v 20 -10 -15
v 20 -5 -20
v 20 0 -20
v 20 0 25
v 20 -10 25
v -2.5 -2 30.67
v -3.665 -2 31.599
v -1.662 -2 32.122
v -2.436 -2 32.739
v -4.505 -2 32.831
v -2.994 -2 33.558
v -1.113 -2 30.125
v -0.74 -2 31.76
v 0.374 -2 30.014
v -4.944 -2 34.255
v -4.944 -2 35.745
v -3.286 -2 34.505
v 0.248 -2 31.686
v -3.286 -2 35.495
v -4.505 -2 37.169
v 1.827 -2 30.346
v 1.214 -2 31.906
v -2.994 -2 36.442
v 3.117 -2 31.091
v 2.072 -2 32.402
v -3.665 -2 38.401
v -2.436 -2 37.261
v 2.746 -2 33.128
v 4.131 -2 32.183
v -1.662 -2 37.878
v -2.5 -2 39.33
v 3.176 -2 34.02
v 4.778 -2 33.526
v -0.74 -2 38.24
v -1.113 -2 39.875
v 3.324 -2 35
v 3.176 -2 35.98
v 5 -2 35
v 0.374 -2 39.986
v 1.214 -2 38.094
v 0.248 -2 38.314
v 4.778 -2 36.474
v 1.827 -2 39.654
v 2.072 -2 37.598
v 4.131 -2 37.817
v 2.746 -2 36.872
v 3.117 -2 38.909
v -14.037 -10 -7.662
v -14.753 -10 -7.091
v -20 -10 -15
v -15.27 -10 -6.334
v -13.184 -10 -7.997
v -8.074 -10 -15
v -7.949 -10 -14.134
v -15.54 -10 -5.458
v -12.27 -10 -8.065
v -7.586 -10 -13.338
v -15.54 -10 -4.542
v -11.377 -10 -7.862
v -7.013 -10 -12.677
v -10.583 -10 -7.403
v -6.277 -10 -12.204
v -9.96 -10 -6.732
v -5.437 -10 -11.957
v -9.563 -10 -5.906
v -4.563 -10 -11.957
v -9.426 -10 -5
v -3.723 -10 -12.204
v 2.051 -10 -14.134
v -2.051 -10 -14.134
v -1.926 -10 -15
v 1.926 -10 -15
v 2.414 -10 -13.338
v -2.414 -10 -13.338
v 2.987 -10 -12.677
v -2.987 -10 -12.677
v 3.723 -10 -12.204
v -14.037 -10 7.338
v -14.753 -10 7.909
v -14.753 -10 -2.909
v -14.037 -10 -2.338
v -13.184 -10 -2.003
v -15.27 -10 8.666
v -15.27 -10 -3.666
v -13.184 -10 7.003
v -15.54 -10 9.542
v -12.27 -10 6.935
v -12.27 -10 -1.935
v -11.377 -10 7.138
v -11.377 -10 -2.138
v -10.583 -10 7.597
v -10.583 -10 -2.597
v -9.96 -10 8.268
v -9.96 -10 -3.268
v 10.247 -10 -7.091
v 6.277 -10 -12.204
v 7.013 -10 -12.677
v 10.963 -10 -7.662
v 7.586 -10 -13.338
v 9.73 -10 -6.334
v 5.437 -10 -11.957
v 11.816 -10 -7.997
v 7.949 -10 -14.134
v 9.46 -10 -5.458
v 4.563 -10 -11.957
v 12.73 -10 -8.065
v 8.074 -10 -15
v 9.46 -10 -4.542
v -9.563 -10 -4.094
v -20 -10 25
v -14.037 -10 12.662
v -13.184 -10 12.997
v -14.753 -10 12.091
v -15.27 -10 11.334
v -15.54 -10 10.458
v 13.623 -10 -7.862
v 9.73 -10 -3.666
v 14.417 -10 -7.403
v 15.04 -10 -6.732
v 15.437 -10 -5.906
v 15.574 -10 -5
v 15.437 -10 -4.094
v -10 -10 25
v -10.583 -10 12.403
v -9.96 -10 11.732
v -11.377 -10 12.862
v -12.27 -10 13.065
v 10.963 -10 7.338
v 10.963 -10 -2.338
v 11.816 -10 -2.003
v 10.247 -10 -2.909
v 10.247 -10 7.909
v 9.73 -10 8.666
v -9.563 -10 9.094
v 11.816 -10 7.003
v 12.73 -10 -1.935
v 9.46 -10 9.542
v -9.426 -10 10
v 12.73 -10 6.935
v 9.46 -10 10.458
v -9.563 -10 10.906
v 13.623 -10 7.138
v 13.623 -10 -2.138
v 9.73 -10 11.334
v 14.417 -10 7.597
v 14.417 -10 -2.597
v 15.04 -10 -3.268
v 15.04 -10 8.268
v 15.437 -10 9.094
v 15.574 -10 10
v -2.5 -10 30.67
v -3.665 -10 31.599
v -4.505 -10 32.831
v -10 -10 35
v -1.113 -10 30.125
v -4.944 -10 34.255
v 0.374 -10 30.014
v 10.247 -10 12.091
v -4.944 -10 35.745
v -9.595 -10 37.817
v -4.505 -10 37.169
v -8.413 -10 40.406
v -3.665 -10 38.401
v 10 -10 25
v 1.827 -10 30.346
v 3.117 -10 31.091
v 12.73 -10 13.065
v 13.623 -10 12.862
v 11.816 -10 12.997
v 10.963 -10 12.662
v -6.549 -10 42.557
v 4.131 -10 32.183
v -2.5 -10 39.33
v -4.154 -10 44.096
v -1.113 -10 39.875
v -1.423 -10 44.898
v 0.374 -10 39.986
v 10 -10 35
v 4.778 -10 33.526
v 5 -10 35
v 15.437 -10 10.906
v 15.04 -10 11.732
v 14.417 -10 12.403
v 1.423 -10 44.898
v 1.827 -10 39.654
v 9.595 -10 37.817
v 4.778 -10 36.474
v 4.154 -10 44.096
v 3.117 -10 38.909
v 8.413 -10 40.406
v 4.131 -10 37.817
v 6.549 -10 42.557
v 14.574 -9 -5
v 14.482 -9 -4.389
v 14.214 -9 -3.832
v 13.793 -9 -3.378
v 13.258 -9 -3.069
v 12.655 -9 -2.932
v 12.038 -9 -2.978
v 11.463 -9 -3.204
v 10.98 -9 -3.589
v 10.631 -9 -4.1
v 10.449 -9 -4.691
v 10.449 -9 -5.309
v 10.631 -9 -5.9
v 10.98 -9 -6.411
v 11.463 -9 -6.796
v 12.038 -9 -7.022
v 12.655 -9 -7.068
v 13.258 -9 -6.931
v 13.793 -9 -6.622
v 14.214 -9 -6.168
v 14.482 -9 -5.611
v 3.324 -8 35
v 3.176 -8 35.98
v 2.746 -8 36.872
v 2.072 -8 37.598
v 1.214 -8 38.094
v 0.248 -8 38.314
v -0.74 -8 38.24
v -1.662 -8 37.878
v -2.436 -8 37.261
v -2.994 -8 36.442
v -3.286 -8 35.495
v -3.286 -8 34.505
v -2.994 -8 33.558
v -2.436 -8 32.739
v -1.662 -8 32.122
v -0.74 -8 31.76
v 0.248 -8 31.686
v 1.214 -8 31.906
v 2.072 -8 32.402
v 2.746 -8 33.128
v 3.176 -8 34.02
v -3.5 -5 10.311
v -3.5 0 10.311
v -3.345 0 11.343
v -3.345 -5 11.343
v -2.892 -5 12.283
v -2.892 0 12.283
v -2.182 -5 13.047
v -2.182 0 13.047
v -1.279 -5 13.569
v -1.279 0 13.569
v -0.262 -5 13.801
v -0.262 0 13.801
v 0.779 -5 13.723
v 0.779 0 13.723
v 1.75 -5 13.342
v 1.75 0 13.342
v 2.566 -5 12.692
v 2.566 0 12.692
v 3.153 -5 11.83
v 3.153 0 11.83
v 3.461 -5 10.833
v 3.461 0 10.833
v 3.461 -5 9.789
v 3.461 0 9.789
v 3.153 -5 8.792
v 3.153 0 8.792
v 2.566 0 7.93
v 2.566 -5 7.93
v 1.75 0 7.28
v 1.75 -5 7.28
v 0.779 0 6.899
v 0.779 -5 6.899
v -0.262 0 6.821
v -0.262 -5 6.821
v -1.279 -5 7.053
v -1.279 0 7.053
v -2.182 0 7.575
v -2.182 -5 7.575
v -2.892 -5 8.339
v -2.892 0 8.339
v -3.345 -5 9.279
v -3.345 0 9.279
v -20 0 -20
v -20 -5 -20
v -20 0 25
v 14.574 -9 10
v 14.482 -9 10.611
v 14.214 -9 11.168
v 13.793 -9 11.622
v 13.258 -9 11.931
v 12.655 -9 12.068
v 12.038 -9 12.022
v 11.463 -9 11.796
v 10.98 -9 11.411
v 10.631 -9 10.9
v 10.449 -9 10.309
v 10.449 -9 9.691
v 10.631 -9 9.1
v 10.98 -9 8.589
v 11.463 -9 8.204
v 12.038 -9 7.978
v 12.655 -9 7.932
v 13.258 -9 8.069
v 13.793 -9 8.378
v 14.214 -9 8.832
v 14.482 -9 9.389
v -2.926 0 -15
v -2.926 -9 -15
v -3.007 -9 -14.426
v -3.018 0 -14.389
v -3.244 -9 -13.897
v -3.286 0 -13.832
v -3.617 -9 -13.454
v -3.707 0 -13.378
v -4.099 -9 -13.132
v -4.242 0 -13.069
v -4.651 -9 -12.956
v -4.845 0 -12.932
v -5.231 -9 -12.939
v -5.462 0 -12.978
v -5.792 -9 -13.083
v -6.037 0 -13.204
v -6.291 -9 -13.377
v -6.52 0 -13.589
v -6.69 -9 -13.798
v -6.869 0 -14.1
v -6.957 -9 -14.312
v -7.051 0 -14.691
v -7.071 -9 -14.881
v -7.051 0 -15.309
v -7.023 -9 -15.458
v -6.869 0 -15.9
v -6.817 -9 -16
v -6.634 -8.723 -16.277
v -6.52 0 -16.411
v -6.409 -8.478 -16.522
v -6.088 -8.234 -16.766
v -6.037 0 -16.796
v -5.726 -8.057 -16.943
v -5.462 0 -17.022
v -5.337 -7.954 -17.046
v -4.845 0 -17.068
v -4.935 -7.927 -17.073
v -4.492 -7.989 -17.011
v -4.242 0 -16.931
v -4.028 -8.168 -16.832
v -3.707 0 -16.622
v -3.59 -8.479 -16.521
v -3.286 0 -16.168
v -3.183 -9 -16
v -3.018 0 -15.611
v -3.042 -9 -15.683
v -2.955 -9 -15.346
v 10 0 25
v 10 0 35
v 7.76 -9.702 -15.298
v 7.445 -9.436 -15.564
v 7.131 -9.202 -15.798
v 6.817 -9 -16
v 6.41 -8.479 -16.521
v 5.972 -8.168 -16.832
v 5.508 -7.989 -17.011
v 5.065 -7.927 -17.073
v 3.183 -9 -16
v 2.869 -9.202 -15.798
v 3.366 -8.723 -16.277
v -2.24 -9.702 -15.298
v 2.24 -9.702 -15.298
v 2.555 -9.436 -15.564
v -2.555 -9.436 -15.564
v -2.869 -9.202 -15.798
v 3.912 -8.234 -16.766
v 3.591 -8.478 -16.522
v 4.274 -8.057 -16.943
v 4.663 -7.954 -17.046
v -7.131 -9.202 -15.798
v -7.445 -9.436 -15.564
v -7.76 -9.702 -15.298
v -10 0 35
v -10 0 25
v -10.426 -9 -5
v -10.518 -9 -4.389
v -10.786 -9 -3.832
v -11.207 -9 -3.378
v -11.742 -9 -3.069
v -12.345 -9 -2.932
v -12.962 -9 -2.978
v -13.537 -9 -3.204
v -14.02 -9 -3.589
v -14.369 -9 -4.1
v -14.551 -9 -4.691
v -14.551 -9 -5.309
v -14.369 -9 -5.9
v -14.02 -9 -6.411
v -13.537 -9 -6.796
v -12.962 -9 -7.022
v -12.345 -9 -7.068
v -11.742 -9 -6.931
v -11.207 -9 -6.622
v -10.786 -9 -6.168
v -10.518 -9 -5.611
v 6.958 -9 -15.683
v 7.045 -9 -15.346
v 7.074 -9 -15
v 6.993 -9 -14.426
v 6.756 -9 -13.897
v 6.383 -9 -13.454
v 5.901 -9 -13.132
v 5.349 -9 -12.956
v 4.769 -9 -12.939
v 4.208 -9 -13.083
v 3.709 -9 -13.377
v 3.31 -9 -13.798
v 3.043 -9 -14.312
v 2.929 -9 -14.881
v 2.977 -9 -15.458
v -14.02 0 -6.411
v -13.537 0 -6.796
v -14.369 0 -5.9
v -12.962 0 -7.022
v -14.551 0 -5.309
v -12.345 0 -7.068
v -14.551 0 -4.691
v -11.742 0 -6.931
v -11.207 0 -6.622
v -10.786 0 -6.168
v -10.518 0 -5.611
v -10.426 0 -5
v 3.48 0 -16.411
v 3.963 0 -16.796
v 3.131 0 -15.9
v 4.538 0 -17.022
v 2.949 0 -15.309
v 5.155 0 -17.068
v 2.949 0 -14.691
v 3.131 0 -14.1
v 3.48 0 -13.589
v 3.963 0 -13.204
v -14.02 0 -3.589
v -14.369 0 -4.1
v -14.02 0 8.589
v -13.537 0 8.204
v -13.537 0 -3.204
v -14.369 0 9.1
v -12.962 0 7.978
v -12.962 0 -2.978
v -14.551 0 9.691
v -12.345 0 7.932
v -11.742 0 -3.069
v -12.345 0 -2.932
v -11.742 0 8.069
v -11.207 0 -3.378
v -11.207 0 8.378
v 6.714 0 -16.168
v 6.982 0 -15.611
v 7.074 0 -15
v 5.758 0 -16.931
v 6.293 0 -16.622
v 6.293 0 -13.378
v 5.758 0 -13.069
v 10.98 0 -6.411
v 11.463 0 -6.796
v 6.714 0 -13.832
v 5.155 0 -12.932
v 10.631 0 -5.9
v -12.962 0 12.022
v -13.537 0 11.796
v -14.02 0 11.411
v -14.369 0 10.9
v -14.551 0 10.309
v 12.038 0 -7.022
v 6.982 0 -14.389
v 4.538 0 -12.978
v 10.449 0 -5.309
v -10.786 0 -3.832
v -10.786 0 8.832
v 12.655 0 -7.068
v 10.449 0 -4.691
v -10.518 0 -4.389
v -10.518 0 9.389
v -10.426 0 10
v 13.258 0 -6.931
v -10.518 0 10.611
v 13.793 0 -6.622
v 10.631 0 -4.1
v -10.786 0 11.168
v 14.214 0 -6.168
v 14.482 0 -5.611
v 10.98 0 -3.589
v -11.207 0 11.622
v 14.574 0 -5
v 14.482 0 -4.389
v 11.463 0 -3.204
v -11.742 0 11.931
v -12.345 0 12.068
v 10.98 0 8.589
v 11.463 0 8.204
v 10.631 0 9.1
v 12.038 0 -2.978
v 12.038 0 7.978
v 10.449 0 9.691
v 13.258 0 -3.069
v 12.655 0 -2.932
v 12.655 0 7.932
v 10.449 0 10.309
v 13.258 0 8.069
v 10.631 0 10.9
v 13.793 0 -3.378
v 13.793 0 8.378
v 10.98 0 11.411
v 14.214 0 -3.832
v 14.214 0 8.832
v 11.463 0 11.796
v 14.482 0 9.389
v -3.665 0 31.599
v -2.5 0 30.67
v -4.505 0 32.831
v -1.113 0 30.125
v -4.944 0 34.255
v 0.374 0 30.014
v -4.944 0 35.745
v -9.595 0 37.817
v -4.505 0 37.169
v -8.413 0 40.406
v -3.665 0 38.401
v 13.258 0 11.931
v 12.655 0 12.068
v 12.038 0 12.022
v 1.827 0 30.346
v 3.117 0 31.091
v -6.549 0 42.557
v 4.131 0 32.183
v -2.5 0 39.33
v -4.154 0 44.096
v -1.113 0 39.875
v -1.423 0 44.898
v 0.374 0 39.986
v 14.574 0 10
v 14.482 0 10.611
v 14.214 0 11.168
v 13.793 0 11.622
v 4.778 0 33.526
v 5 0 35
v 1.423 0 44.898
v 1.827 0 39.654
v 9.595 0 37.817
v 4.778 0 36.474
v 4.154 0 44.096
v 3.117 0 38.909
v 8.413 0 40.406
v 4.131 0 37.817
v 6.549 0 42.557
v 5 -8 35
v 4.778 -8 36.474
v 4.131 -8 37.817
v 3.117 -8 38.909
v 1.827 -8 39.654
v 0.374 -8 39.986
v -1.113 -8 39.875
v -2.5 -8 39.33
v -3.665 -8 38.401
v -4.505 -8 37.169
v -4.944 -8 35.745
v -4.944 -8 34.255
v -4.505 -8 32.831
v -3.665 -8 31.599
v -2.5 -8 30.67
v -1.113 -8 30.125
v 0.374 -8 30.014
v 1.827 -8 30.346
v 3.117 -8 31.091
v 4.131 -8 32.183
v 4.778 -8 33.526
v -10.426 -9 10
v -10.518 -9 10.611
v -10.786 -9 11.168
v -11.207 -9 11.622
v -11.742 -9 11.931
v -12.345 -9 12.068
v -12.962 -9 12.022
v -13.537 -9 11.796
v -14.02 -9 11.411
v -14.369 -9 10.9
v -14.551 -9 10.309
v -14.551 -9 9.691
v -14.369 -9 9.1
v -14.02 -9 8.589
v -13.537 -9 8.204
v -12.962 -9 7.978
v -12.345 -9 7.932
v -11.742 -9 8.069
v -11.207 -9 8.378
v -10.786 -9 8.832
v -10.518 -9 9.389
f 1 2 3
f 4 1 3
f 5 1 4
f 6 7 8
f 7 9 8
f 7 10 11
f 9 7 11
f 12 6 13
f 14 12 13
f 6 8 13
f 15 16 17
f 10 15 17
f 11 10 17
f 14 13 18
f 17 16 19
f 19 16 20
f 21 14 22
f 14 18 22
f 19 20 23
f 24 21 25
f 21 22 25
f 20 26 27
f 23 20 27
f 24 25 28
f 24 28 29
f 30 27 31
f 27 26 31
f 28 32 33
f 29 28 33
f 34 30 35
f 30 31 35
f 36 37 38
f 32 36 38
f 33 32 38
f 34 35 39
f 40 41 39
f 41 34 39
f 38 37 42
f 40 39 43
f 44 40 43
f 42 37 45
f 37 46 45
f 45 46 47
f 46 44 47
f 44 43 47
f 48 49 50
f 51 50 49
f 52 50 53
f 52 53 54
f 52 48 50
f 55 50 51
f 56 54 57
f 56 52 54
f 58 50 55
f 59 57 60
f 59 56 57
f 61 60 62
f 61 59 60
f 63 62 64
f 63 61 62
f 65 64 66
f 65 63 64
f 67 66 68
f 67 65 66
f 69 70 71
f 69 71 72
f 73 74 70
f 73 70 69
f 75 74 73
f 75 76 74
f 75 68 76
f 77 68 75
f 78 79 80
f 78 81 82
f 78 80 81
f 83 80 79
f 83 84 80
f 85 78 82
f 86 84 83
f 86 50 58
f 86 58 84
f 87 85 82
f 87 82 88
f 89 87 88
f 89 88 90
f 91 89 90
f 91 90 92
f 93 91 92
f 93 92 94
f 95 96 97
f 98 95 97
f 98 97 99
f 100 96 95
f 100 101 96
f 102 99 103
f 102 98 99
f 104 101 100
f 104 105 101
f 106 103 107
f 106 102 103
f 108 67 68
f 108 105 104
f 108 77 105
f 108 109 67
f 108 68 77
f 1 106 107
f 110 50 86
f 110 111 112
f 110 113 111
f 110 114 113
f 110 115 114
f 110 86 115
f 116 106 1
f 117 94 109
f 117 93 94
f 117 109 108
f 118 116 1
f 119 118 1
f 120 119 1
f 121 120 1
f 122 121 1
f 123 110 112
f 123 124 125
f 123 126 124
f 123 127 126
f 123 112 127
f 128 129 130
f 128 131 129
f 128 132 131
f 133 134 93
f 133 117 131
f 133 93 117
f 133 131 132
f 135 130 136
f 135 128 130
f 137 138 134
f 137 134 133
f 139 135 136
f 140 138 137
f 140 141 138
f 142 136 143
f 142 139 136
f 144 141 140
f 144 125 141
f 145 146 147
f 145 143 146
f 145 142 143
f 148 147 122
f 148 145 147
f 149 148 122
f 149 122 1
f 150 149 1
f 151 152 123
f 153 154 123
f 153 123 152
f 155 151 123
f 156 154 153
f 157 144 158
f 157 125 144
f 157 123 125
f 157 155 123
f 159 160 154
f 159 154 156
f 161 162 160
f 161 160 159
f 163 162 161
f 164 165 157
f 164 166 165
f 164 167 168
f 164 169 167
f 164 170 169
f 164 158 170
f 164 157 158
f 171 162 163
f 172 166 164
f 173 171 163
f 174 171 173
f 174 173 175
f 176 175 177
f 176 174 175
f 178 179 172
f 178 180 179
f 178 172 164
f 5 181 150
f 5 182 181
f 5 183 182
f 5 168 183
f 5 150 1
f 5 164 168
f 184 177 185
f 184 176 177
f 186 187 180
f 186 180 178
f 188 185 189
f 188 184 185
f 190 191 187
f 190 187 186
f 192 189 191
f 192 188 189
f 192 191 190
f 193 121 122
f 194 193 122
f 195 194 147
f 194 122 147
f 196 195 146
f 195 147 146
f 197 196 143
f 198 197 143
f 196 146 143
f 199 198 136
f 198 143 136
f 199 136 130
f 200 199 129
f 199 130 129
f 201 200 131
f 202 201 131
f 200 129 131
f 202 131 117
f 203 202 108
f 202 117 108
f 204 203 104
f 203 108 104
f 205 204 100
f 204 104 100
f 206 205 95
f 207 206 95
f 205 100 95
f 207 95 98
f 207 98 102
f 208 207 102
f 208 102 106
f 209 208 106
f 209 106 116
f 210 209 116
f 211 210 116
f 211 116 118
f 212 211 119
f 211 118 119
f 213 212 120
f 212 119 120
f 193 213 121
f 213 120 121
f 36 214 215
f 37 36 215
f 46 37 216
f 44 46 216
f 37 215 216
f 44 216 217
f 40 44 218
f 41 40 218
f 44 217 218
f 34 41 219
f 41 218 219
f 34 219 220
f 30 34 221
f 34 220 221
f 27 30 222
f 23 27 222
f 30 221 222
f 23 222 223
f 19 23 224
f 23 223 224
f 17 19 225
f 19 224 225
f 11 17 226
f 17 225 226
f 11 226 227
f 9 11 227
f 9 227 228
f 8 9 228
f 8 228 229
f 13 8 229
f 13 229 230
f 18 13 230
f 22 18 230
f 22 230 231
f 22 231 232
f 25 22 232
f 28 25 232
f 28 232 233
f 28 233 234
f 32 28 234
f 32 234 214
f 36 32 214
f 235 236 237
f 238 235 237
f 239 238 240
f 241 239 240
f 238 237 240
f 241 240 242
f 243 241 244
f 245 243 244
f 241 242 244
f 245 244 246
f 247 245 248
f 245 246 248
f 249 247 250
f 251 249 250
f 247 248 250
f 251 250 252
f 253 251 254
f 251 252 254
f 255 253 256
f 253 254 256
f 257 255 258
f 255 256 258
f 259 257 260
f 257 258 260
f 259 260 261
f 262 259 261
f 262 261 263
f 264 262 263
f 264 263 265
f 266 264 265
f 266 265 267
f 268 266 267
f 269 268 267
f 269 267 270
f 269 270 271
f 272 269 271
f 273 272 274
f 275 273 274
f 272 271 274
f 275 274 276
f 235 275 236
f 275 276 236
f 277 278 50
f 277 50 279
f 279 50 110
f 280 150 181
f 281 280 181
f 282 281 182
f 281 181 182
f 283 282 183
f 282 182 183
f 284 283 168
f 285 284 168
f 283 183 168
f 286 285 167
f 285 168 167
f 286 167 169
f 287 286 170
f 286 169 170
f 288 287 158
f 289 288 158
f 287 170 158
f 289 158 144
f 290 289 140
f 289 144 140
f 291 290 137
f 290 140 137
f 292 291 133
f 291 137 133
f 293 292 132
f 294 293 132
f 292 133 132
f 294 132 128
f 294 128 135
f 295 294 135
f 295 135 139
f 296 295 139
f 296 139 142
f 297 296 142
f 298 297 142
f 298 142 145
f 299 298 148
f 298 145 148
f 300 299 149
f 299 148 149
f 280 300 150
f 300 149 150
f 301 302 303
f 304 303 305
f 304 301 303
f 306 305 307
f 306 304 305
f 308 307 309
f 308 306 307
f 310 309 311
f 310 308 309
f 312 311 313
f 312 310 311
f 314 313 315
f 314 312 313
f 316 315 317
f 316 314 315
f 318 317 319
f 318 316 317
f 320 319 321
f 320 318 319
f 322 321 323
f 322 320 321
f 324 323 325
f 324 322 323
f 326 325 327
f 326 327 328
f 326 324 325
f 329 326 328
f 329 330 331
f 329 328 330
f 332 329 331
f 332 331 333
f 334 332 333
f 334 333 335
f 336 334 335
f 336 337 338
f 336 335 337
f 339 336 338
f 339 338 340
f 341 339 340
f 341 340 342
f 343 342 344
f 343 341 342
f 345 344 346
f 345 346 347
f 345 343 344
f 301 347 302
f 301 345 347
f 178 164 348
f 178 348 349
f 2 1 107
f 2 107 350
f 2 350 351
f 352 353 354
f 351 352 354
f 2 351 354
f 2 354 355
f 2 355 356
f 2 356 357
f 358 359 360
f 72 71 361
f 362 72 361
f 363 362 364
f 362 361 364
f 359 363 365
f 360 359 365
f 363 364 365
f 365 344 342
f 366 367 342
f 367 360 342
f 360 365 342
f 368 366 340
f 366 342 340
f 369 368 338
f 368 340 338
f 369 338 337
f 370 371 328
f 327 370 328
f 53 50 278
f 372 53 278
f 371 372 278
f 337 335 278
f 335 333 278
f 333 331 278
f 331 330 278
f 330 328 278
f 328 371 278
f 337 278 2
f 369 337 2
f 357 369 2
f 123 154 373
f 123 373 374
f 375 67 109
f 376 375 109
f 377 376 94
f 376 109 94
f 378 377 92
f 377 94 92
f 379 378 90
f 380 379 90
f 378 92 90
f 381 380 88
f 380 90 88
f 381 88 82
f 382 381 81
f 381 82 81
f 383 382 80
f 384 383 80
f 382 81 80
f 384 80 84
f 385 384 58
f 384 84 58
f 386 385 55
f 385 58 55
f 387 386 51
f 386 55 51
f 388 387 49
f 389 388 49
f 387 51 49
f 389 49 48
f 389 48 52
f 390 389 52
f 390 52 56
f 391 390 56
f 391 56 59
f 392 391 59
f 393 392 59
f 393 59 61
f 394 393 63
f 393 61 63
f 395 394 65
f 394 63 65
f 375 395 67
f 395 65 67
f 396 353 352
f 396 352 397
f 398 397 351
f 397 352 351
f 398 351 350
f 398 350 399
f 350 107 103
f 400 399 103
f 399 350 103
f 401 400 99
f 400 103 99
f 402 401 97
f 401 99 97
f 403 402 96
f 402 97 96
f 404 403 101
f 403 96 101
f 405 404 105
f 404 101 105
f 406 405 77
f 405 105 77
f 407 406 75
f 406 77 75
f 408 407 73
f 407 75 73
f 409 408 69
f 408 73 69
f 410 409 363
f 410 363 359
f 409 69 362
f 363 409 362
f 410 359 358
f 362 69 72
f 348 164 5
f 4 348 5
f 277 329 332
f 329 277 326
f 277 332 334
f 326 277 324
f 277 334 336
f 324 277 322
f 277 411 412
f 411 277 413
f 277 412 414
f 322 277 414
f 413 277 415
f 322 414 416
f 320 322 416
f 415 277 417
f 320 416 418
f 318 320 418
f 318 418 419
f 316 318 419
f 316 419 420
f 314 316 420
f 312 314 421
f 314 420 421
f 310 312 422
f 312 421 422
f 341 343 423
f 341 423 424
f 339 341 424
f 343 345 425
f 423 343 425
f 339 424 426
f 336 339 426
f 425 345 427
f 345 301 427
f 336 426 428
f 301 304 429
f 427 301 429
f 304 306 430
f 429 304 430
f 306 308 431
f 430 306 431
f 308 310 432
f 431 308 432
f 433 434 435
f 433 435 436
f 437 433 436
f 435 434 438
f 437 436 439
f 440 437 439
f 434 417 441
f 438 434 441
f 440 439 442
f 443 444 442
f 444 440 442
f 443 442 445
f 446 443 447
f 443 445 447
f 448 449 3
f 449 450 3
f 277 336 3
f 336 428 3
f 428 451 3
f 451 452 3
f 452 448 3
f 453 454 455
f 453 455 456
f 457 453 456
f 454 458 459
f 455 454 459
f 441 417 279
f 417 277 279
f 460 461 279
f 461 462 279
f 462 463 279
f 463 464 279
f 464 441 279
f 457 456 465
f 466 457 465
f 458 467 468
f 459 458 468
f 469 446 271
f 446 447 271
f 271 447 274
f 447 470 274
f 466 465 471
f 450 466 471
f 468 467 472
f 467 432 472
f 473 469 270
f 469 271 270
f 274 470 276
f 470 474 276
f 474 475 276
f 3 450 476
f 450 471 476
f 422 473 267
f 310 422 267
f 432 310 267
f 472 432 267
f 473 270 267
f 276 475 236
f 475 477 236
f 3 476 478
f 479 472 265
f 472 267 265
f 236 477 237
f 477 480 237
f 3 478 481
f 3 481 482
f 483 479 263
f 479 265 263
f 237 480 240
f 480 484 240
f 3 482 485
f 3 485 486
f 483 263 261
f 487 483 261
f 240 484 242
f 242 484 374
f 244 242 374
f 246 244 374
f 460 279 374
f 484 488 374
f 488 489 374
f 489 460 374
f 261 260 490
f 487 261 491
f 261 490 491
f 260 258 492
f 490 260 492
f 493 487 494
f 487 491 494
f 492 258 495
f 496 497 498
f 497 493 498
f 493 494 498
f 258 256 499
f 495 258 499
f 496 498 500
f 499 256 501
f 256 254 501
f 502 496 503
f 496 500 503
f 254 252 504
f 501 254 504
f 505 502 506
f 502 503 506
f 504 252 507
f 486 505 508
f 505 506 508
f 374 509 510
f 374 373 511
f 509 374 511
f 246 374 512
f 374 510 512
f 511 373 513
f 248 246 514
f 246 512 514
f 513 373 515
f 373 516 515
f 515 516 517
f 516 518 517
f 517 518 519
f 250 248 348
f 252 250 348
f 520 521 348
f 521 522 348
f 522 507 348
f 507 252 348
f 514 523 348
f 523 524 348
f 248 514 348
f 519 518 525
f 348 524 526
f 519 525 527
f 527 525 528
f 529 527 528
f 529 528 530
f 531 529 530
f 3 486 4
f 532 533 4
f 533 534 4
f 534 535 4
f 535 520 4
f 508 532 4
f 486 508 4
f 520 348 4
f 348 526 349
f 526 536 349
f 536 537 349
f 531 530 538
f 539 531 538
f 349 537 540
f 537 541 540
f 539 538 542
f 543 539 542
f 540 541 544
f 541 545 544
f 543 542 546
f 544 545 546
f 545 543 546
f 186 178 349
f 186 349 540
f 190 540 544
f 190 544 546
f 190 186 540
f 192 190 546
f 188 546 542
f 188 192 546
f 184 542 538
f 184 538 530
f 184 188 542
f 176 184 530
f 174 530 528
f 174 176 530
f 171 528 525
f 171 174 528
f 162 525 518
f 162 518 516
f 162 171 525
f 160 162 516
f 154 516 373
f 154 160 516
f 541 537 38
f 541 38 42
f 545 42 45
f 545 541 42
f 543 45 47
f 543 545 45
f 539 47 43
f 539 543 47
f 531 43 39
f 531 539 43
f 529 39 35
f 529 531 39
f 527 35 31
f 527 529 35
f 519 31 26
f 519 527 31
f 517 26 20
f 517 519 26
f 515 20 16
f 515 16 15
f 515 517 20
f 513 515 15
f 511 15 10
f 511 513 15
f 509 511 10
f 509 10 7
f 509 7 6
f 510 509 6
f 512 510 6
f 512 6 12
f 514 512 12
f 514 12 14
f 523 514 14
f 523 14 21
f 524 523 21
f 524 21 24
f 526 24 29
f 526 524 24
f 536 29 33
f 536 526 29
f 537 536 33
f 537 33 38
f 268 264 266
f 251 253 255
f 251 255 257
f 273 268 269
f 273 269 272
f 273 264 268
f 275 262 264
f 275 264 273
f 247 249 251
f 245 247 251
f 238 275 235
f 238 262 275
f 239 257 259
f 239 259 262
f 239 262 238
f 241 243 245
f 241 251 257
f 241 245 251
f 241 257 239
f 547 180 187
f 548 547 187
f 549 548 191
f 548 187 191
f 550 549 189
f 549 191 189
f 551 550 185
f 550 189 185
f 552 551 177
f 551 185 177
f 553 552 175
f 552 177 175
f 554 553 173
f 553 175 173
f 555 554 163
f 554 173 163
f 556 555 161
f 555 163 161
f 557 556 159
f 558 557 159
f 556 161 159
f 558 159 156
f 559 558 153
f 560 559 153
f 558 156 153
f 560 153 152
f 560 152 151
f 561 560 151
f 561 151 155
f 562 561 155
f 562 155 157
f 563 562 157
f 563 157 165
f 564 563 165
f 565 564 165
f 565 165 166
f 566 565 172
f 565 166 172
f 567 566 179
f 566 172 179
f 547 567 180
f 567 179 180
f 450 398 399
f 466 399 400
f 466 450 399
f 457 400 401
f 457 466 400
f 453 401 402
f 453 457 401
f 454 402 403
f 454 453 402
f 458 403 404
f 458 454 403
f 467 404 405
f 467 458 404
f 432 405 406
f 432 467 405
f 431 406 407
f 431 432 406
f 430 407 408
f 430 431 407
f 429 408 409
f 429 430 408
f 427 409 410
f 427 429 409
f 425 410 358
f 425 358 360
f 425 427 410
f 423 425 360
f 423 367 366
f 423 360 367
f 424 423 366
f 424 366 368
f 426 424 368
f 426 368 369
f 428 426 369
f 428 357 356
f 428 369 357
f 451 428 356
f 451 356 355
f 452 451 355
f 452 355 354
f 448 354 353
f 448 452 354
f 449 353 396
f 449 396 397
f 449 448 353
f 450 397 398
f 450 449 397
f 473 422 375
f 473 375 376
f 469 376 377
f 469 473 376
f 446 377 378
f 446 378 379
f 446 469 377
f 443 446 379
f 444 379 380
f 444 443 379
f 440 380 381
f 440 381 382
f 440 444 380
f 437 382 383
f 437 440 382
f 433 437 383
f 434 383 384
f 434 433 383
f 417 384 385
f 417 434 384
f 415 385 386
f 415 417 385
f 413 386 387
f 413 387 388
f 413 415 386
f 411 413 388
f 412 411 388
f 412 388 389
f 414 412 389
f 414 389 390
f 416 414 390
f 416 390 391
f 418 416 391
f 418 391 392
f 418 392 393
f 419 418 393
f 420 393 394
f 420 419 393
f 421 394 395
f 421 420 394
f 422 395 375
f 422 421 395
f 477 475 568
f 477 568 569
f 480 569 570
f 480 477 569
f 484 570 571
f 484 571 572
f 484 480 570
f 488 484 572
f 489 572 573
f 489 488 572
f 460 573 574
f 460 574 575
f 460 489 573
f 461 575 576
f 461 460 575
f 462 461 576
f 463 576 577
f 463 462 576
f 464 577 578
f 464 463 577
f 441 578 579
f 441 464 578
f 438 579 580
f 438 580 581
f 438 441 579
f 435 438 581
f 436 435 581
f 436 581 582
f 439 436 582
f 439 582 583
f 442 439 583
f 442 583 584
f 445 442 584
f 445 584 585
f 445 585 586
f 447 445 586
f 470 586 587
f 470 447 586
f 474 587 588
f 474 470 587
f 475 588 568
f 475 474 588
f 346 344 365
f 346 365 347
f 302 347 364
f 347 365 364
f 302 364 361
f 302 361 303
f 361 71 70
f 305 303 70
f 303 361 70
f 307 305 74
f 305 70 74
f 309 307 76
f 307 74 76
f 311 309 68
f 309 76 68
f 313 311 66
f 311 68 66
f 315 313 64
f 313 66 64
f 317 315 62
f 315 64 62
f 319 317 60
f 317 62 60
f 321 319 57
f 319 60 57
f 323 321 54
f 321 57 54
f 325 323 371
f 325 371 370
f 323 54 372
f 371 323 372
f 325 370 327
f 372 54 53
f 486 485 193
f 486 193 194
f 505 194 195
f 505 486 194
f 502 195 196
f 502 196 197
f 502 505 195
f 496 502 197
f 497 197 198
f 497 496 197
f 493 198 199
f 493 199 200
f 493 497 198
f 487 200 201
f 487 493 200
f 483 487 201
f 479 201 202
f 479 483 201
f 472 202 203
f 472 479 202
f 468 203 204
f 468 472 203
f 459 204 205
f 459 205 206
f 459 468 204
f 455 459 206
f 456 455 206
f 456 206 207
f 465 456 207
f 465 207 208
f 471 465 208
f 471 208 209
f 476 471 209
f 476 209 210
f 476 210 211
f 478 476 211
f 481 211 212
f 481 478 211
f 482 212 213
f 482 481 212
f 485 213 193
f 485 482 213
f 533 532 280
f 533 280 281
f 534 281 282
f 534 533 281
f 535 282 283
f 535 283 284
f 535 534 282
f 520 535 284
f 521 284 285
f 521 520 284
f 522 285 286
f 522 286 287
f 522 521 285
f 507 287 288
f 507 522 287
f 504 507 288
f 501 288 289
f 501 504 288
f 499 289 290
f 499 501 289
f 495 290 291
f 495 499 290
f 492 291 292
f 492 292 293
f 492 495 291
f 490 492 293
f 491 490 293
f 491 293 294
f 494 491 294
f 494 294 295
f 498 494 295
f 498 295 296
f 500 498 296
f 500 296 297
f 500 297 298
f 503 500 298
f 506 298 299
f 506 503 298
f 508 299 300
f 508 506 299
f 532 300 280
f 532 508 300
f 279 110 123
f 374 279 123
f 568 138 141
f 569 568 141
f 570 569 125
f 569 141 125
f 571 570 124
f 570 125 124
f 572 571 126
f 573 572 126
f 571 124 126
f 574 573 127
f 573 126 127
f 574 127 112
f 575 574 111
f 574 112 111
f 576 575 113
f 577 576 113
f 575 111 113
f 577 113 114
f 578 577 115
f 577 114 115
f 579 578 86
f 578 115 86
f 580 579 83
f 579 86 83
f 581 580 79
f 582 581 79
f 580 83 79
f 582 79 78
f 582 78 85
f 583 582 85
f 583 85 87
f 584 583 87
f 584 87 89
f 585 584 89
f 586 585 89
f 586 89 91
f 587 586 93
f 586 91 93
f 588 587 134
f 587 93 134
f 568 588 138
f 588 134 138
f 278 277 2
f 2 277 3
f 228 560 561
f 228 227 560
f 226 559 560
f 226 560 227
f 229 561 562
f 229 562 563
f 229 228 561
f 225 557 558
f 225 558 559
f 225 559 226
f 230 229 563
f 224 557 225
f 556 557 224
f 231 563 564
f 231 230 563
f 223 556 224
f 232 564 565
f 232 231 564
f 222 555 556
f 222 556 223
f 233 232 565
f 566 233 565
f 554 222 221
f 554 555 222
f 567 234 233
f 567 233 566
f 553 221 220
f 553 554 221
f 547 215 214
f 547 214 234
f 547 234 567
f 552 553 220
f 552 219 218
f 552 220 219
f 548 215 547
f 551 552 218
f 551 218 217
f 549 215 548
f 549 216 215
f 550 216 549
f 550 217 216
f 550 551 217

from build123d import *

# Parameters (mm, degrees)
F0_W         = 40
F0_H         = 40
F0_R         = 2.074
F1_DEPTH     = 10
F2_W         = 10
F2_H         = 5
F3_DEPTH     = 10
F4_SIZE      = 1
F5_R         = 3.3235
F6_DEPTH     = 10.001
F7_R         = 5
F7_R_2       = 3.3235
F8_DEPTH     = 2
F10_R        = 3.5
F11_DEPTH    = 5
F12_T1_DEPTH = 65.7168298797


# Not quite as in the source:
# - a fillet or chamfer that OpenCascade refuses, or shapes differently, is made with other operations: its cross-section is extruded or revolved along the edge and cut away or added
# - a pattern or mirror of a feature is missing from the dataset's text; its kind, count and spacing are read off the source's solid


with BuildPart() as f1:
    # F0 (on Front) → F1 (new body)
    with BuildSketch(Plane.XZ):
        Rectangle(F0_W, F0_H)
        with Locations((-5, -15)):
            Circle(F0_R, mode=Mode.SUBTRACT)
        with Locations((-12.5, -5)):
            Circle(F0_R, mode=Mode.SUBTRACT)
        with Locations((5, -15)):
            Circle(F0_R, mode=Mode.SUBTRACT)
        with Locations((12.5, -5)):
            Circle(F0_R, mode=Mode.SUBTRACT)
        with Locations((-12.5, 10)):
            Circle(F0_R, mode=Mode.SUBTRACT)
        with Locations((12.5, 10)):
            Circle(F0_R, mode=Mode.SUBTRACT)
    extrude(amount=F1_DEPTH)

    # F2 (on face) → F3 (join, through all)
    with BuildSketch(Plane.XZ.offset(10)):
        with BuildLine():
            Line((10, 25), (10, 35))
            ThreePointArc((10, 35), (0, 45), (-10, 35))
            Line((-10, 35), (-10, 25))
            Line((-10, 25), (-10, 20))
            Line((-10, 20), (10, 20))
            Line((10, 20), (10, 25))
        make_face()
        with Locations((-15, 22.5)):
            Rectangle(F2_W, F2_H)
        with Locations((15, 22.5)):
            Rectangle(F2_W, F2_H)
    extrude(amount=-F3_DEPTH)

    # F4
    f4_edges = [f1.edges().sort_by_distance(p)[0] for p in [
        (-7.074, -10, -15),
        (2.926, -10, -15),
        (-14.574, -10, 10),
        (-14.574, -10, -5),
        (10.426, -10, -5),
        (10.426, -10, 10),
    ]]
    chamfer(f4_edges, length=F4_SIZE)

    # F5 (on face) → F6 (cut, through all)
    with BuildSketch(Plane.XZ.offset(10)):
        with Locations((0, 35)):
            Circle(F5_R)
    extrude(amount=-F6_DEPTH, mode=Mode.SUBTRACT)

    # F7 (on face) → F8 (cut)
    with BuildSketch(Plane.XZ.offset(10)):
        with Locations((0, 35)):
            Circle(F7_R)
        with Locations((0, 35)):
            Circle(F7_R_2, mode=Mode.SUBTRACT)
    f8 = extrude(amount=-F8_DEPTH, mode=Mode.SUBTRACT)

    # F8_copies: F8 across plane
    add(f8.mirror(Plane.ZX.offset(-5)), mode=Mode.SUBTRACT)

    # F10 (on face) → F11 (cut)
    with BuildSketch(Plane(origin=(0, 0, 0), x_dir=(-1, 0, 0), z_dir=(0, 1, 0))):
        with Locations((0, 10.311)):
            Circle(F10_R)
    extrude(amount=-F11_DEPTH, mode=Mode.SUBTRACT)

    # F12: chamfer of 5 on 1 edges, made by hand

    # F12_s2 → F12_t1 (cut)
    with BuildSketch(Plane.YZ.offset(-32.8584149398)):
        Polygon((-10, -15), (-5, -20), (-10, -20), align=None)
    extrude(amount=F12_T1_DEPTH, mode=Mode.SUBTRACT)


solid = f1.part
